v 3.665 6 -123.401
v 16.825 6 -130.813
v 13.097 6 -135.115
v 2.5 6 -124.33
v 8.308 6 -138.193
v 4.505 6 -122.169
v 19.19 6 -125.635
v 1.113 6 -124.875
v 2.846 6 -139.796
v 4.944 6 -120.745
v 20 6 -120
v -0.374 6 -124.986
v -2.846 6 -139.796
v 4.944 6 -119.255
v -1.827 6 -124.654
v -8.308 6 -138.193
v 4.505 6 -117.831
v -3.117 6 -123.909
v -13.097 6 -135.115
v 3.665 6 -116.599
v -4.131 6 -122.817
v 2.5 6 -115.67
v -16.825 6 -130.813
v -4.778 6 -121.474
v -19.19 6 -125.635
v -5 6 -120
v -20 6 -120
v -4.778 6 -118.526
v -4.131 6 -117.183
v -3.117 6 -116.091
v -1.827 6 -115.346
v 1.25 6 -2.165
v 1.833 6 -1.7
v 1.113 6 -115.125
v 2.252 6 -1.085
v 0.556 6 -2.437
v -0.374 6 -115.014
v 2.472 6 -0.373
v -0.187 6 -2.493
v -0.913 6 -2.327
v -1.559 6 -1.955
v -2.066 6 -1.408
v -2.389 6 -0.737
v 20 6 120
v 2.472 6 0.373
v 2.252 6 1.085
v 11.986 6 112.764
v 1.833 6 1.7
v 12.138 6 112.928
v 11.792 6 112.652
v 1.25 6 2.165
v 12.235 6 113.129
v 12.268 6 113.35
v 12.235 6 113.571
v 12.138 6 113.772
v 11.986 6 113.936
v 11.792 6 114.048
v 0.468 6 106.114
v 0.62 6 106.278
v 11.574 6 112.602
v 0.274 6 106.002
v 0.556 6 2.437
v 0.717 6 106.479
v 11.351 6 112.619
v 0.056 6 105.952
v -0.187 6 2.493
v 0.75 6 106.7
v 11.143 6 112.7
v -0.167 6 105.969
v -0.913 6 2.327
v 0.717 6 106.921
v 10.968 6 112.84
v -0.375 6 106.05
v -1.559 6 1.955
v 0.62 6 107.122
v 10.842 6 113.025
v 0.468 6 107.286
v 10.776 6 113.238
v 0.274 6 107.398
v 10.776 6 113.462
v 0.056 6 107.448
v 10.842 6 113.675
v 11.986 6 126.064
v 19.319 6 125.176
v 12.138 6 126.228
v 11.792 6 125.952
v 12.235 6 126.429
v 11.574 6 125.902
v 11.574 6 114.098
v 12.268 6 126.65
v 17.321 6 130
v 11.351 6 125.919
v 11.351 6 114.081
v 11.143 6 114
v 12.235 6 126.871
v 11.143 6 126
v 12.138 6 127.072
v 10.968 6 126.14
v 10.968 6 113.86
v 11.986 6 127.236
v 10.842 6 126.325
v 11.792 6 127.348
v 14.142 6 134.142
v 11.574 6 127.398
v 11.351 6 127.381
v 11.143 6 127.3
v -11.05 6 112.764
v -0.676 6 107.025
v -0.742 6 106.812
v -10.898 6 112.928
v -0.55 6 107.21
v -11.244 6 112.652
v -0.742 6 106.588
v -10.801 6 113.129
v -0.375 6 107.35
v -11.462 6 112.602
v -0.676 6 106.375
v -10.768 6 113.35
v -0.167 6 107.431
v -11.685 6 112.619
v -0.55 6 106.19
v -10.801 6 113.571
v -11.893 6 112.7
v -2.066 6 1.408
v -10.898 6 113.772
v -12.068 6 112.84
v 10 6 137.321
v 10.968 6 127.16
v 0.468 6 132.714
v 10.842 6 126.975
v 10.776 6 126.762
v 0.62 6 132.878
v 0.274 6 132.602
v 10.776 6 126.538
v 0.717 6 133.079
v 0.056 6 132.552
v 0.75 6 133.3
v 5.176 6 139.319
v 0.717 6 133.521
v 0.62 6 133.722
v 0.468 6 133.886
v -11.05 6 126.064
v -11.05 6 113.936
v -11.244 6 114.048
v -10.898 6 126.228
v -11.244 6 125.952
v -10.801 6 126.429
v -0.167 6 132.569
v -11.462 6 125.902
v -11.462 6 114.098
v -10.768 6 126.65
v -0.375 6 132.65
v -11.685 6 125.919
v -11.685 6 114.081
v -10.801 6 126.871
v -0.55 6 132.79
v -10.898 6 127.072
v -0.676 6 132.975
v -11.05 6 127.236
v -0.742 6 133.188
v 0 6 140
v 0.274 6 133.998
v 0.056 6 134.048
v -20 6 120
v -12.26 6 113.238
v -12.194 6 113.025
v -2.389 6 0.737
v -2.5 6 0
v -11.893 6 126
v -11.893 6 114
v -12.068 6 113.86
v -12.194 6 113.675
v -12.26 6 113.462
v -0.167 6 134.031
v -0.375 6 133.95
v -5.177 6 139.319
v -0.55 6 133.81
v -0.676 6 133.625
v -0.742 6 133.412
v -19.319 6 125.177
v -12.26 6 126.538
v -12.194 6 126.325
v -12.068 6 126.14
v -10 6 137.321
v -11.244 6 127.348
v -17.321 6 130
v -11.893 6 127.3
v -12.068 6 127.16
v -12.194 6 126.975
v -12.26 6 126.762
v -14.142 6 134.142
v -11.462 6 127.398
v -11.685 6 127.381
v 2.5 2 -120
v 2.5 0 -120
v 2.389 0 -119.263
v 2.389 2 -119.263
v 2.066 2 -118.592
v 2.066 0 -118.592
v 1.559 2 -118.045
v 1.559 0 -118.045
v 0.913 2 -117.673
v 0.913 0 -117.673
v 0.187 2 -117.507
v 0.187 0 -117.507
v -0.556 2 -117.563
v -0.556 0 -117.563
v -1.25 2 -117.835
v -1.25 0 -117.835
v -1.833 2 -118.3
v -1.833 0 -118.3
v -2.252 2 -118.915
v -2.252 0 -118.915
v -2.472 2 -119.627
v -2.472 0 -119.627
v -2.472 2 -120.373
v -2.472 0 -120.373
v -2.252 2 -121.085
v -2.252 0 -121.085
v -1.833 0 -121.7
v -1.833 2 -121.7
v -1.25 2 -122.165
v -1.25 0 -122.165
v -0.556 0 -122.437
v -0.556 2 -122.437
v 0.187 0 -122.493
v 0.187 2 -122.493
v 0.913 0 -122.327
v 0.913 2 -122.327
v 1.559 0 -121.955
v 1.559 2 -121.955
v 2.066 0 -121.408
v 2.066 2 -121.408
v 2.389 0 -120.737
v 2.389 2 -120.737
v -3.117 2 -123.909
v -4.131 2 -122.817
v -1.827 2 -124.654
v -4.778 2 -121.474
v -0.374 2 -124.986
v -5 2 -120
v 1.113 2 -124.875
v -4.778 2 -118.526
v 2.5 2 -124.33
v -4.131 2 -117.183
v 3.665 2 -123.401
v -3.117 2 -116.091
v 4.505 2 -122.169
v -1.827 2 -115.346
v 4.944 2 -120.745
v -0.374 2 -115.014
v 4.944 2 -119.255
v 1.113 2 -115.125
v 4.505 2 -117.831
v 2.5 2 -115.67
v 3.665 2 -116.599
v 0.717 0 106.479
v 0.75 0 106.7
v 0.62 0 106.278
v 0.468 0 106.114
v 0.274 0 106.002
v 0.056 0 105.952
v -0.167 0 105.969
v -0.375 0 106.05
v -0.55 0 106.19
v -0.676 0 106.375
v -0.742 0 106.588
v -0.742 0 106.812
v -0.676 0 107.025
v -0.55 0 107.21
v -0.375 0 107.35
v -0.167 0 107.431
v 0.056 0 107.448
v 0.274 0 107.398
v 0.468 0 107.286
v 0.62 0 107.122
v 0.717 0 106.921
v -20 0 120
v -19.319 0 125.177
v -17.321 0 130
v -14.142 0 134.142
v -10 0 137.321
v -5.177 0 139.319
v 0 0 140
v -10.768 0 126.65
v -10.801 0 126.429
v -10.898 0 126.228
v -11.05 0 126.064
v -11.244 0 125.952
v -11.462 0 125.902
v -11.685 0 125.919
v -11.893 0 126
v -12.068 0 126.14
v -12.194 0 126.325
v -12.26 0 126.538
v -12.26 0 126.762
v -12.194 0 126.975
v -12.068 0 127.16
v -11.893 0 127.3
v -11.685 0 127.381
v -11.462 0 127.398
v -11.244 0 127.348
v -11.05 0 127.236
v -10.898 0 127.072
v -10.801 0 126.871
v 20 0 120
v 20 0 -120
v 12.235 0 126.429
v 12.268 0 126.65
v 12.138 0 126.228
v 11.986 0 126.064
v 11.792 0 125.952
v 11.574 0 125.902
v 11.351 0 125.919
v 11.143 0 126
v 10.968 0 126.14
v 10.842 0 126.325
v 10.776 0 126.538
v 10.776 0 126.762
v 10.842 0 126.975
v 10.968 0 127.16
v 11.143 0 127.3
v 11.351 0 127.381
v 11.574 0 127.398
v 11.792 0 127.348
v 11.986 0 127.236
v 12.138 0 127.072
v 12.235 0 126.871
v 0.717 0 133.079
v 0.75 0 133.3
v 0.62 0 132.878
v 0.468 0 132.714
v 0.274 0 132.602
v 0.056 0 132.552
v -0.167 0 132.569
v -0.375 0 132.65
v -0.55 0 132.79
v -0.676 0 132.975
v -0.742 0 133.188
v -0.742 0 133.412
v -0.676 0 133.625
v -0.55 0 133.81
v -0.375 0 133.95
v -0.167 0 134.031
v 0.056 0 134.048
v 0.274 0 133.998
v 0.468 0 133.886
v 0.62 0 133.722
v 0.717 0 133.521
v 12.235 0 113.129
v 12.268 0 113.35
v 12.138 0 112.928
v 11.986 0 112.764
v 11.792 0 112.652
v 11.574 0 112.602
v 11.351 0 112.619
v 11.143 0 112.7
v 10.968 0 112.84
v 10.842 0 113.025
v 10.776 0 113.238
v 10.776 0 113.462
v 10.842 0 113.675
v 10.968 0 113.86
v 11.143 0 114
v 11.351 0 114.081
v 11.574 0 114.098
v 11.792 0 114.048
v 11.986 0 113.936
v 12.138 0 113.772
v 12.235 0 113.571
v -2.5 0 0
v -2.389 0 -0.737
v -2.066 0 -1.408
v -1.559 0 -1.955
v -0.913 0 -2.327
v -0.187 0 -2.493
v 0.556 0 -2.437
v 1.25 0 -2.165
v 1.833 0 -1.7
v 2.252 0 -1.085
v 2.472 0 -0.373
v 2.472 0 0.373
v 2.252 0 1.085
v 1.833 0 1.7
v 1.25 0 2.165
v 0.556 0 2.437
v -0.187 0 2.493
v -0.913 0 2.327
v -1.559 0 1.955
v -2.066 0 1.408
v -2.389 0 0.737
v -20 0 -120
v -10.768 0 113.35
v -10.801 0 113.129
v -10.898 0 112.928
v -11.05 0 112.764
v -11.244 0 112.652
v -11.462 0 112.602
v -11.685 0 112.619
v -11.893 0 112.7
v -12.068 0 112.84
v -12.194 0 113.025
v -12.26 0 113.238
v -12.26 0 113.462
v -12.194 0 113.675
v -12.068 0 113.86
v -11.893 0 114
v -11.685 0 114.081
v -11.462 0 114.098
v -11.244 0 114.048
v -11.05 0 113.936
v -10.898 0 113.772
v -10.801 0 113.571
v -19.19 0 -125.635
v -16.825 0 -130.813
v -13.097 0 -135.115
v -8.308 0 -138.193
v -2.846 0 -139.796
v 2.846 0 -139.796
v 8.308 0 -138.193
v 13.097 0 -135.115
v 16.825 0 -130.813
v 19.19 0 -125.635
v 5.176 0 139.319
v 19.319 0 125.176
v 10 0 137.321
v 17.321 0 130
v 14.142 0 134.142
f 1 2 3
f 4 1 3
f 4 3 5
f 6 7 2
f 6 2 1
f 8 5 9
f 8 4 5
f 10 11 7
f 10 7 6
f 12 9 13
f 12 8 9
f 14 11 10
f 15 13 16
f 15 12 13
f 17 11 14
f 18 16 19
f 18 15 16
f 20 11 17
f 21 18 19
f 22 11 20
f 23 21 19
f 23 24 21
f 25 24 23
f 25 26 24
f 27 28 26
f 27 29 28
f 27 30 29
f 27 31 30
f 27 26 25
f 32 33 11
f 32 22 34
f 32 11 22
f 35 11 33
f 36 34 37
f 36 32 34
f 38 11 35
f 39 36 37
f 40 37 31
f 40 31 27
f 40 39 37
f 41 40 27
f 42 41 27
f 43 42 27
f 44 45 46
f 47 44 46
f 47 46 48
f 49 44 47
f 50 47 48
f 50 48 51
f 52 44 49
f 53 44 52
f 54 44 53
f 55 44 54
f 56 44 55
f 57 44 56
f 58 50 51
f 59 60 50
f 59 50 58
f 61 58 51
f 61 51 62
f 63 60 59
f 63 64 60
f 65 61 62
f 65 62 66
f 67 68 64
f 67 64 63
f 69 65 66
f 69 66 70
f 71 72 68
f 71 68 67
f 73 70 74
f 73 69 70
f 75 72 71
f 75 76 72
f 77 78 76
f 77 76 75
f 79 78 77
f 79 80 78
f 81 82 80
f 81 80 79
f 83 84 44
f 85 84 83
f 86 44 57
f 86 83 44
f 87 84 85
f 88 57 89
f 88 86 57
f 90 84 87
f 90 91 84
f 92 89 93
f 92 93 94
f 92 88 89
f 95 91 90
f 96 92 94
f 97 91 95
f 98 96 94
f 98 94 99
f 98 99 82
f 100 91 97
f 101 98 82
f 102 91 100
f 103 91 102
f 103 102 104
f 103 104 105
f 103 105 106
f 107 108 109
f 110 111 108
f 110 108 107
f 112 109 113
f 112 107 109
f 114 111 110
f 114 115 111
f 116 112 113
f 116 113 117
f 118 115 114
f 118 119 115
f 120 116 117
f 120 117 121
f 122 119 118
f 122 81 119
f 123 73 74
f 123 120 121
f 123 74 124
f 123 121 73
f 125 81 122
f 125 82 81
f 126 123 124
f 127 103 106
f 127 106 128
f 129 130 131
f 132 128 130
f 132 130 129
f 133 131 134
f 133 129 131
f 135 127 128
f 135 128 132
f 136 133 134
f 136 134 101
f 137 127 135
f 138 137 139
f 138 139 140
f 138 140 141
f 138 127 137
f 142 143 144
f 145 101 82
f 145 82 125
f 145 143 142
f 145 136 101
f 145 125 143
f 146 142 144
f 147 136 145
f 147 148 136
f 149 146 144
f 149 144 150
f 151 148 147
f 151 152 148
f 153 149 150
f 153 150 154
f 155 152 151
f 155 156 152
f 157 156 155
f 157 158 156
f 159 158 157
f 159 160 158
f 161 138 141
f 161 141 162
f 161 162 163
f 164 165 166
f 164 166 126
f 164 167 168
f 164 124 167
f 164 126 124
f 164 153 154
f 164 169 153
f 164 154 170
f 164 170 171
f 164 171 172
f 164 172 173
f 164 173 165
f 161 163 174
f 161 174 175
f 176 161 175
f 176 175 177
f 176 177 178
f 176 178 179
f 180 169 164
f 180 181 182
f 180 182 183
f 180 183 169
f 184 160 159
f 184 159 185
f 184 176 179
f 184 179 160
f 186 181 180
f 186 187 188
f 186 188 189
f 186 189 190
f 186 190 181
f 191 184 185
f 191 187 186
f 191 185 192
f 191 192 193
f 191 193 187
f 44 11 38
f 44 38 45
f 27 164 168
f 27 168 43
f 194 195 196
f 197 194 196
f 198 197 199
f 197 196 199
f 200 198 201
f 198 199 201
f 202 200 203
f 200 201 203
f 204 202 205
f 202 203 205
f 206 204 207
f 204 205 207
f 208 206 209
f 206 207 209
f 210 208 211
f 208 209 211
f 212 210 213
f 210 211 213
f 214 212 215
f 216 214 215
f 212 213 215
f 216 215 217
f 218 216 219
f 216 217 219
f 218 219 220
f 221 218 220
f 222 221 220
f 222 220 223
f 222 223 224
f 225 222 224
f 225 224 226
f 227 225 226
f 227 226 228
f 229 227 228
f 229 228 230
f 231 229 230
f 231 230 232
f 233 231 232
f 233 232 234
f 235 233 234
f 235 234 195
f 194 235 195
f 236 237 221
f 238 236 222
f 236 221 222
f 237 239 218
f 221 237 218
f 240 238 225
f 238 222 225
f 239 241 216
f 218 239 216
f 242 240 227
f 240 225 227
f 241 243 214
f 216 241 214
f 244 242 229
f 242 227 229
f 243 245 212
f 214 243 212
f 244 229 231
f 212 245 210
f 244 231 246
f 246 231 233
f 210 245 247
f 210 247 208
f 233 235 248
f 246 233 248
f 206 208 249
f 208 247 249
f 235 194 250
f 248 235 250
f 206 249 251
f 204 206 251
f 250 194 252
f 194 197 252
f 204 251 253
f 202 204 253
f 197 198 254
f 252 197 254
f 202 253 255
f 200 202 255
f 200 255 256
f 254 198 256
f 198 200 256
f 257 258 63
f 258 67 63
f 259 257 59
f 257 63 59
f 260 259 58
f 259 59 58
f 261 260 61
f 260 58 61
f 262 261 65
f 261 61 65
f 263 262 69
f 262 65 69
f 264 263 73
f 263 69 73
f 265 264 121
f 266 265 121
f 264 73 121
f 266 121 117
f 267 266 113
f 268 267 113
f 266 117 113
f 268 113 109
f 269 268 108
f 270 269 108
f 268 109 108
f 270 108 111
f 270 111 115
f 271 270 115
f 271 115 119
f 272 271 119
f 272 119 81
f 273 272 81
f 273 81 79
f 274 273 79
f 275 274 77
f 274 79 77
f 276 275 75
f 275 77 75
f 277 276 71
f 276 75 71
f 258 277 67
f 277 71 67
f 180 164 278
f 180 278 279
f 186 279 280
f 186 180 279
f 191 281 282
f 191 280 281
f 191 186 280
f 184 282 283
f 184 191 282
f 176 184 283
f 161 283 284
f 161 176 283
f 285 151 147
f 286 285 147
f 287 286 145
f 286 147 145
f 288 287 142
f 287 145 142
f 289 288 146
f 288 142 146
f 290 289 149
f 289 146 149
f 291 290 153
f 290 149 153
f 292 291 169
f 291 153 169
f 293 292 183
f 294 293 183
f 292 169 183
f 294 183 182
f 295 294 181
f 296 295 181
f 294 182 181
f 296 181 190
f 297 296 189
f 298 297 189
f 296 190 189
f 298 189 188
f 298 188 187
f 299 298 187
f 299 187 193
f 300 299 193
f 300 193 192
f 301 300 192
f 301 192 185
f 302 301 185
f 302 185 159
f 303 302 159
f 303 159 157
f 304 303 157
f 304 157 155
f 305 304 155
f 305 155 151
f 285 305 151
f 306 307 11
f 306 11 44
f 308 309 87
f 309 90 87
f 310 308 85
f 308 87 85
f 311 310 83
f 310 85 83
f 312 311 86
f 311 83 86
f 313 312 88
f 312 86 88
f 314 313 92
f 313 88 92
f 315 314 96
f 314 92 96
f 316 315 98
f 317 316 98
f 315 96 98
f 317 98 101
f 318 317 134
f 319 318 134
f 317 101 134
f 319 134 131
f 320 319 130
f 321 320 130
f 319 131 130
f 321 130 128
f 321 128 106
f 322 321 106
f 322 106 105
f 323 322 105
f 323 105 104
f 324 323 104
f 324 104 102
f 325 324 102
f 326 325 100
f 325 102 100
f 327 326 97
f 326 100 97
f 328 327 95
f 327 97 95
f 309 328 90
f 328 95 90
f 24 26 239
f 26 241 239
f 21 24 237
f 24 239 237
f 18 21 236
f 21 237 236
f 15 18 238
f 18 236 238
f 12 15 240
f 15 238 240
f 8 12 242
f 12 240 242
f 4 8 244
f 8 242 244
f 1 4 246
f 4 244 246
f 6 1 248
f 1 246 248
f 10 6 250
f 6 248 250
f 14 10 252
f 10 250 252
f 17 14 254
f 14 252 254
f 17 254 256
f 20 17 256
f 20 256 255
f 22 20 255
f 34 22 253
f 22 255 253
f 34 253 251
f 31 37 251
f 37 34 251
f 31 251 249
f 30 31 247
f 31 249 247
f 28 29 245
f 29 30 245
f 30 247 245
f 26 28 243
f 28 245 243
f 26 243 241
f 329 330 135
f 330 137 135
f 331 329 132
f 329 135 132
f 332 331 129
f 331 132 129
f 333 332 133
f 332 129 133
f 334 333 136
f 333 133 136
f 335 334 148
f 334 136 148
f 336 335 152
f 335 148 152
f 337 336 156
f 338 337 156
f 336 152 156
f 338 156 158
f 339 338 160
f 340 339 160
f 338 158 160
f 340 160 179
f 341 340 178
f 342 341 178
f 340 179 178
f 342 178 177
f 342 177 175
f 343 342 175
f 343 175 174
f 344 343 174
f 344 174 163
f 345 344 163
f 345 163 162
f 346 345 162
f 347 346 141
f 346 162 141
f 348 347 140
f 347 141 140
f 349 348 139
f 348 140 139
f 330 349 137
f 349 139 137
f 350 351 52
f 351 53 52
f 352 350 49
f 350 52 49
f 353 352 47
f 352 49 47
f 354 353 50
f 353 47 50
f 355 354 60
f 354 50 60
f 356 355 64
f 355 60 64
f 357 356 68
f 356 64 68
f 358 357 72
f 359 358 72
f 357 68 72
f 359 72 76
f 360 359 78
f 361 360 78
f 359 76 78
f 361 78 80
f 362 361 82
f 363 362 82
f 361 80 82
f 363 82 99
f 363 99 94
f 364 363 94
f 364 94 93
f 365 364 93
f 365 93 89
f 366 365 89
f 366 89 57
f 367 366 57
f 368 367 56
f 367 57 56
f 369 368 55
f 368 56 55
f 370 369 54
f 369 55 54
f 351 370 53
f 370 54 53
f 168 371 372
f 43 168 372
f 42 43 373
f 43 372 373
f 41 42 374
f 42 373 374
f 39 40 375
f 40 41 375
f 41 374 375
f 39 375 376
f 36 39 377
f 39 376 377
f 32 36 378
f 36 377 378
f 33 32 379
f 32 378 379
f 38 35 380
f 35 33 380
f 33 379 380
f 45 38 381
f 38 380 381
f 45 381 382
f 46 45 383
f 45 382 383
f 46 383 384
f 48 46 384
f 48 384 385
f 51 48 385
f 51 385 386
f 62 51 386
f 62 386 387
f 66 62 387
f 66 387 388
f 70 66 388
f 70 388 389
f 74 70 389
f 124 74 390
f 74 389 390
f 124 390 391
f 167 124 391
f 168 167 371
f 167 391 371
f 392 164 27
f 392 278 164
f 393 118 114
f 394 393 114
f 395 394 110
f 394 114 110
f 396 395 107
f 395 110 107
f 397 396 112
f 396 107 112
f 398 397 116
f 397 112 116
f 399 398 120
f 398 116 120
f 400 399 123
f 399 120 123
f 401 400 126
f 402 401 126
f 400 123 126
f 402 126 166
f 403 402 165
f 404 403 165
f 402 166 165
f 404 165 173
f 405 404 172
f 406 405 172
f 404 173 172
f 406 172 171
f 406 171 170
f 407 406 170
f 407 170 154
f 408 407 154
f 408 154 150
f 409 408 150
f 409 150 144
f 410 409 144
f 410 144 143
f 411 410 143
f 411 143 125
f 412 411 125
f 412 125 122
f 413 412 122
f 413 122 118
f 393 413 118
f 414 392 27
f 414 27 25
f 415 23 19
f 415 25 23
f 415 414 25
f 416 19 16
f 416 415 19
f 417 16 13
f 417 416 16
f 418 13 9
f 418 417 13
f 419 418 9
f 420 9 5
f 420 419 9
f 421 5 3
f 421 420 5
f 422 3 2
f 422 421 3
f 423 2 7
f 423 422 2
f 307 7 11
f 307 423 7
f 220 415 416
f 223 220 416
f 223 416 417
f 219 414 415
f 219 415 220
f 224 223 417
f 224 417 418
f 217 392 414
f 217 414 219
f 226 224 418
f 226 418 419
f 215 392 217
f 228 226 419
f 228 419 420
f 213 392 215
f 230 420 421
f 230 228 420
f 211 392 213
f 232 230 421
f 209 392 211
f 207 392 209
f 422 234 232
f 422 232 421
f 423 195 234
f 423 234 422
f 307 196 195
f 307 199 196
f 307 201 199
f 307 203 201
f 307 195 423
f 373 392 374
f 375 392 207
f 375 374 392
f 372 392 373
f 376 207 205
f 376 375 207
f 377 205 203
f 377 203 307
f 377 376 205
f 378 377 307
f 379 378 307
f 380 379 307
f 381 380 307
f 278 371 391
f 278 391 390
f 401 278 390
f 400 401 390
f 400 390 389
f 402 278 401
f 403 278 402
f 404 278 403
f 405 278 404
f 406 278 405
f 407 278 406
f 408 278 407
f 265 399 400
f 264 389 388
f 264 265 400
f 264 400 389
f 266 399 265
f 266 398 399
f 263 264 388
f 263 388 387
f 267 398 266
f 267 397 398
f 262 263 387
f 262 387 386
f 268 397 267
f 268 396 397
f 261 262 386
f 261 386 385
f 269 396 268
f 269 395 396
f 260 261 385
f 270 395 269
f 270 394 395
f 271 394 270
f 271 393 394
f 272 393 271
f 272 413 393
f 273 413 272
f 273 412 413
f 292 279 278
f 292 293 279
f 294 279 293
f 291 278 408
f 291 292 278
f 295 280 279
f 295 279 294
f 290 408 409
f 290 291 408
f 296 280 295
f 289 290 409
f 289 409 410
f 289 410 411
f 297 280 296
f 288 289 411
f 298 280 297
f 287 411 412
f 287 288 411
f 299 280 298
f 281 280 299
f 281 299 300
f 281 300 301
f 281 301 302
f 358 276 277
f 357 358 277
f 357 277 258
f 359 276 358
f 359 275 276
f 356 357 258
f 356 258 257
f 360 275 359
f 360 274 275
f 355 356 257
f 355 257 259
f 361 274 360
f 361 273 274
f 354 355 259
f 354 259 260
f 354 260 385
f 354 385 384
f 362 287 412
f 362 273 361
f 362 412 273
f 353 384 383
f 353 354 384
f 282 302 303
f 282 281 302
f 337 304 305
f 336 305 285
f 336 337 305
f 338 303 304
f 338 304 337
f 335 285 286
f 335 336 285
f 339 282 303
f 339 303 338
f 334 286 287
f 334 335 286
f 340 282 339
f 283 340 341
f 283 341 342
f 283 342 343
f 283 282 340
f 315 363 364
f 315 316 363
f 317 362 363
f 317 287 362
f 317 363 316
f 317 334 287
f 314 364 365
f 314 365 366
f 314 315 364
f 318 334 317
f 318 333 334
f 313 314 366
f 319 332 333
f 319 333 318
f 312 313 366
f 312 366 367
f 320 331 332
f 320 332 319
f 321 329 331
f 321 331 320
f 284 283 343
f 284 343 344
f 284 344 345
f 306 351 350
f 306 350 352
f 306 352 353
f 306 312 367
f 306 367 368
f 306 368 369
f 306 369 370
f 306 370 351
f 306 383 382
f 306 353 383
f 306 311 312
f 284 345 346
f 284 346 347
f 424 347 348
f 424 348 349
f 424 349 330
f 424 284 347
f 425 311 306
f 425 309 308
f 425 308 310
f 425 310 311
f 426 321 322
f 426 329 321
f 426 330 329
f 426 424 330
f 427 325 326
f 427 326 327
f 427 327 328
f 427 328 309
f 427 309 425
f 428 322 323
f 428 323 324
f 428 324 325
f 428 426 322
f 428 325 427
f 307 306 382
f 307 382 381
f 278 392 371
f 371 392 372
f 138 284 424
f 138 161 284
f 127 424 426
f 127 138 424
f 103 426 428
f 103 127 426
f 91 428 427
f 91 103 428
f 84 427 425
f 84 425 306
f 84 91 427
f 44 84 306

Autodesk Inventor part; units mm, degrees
ref_plane "YZ Plane" through (0, 0, 0) normal (1, 0, 0) x (0, 1, 0)
ref_plane "XZ Plane" through (0, 0, 0) normal (0, 1, 0) x (-1, 0, 0)
ref_plane "XY Plane" through (0, 0, 0) normal (0, 0, 1) x (1, 0, 0)
sketch "Szkic1" plane through (0, 0, 0) normal (0, 1, 0) x (-1, 0, 0)
  line L0 (-20, 140) -> (20, 140)
  line L1 (20, 140) -> (20, -120)
  line L2 (0, -140) -> (0, -140)
  line L3 (-20, -120) -> (-20, 140)
  arc A0 (0, -140) -> (20, -120) centre (0, -120) ccw
  arc A1 (-20, -120) -> (0, -140) centre (0, -120) ccw
  circle A2 centre (0, -120) radius 5
  circle A3 centre (0, 0) radius 2.5
  point P0 (20, -120)
  point P1 (0, -140)
  point P2 (-20, -120)
  point P3 (20, -120)
  point P4 (-20, -120)
  point P5 (0, -140)
  dimension "d3" = 20
  dimension "d4" = 20
  dimension "d9" = 5
extrude "Wyciągnięcie proste2" add sketch "Szkic1" along normal blind 6
sketch "Szkic2" plane through (0, 6, 0) normal (0, 1, 0) x (1, 0, 0)
  line L0 (0, -106.7) -> (11.5181, -113.35)
  line L1 (11.5181, -113.35) -> (11.5181, -126.65)
  line L2 (11.5181, -126.65) -> (0, -133.3)
  line L3 (0, -133.3) -> (-11.5181, -126.65)
  line L4 (-11.5181, -126.65) -> (-11.5181, -113.35)
  line L5 (-11.5181, -113.35) -> (0, -106.7)
  circle A0 centre (-11.5181, -113.35) radius 0.75
  circle A1 centre (0, -106.7) radius 0.75
  circle A2 centre (11.5181, -113.35) radius 0.75
  circle A3 centre (11.5181, -126.65) radius 0.75
  circle A4 centre (0, -133.3) radius 0.75
  circle A5 centre (-11.5181, -126.65) radius 0.75
  point P0 (0, 0)
  point P1 (-20.5841, -116.7396)
  point P2 (0, -120)
  point P3 (0, -120)
  point P4 (0, -120)
  dimension "d12" = 1.5
  dimension "d13" = 1.5
  dimension "d14" = 1.5
  dimension "d15" = 1.5
  dimension "d16" = 1.5
  dimension "d17" = 1.5
extrude "Wyciągnięcie proste3" cut sketch "Szkic2" against normal blind 6 contours L5 A1 L0 | L0 A1 L5 | A2 L1 L0 | L0 L1 A2 | A0 L4 L5 | L5 L4 A0 | A3 L2 L1 | L1 L2 A3 | A5 L3 L4 | L4 L3 A5 | A4 L3 L2 | L2 L3 A4
sketch "Szkic3" plane through (0, 0, 0) normal (0, -1, 0) x (1, 0, 0)
  circle A0 centre (0, -120) radius 5
  circle A1 centre (0, -120) radius 2.5
  point P0 (0, 0)
  dimension "d30" = 10
  dimension "d31" = 5
extrude "Wyciągnięcie proste4" add sketch "Szkic3" against normal blind 2
fillet "Zaokrąglenie1" radius 20 1 edges at (20, 3, 140)
fillet "Zaokrąglenie2" radius 20 1 edges at (-20, 3, 140)
properties part number "GroundArm"
